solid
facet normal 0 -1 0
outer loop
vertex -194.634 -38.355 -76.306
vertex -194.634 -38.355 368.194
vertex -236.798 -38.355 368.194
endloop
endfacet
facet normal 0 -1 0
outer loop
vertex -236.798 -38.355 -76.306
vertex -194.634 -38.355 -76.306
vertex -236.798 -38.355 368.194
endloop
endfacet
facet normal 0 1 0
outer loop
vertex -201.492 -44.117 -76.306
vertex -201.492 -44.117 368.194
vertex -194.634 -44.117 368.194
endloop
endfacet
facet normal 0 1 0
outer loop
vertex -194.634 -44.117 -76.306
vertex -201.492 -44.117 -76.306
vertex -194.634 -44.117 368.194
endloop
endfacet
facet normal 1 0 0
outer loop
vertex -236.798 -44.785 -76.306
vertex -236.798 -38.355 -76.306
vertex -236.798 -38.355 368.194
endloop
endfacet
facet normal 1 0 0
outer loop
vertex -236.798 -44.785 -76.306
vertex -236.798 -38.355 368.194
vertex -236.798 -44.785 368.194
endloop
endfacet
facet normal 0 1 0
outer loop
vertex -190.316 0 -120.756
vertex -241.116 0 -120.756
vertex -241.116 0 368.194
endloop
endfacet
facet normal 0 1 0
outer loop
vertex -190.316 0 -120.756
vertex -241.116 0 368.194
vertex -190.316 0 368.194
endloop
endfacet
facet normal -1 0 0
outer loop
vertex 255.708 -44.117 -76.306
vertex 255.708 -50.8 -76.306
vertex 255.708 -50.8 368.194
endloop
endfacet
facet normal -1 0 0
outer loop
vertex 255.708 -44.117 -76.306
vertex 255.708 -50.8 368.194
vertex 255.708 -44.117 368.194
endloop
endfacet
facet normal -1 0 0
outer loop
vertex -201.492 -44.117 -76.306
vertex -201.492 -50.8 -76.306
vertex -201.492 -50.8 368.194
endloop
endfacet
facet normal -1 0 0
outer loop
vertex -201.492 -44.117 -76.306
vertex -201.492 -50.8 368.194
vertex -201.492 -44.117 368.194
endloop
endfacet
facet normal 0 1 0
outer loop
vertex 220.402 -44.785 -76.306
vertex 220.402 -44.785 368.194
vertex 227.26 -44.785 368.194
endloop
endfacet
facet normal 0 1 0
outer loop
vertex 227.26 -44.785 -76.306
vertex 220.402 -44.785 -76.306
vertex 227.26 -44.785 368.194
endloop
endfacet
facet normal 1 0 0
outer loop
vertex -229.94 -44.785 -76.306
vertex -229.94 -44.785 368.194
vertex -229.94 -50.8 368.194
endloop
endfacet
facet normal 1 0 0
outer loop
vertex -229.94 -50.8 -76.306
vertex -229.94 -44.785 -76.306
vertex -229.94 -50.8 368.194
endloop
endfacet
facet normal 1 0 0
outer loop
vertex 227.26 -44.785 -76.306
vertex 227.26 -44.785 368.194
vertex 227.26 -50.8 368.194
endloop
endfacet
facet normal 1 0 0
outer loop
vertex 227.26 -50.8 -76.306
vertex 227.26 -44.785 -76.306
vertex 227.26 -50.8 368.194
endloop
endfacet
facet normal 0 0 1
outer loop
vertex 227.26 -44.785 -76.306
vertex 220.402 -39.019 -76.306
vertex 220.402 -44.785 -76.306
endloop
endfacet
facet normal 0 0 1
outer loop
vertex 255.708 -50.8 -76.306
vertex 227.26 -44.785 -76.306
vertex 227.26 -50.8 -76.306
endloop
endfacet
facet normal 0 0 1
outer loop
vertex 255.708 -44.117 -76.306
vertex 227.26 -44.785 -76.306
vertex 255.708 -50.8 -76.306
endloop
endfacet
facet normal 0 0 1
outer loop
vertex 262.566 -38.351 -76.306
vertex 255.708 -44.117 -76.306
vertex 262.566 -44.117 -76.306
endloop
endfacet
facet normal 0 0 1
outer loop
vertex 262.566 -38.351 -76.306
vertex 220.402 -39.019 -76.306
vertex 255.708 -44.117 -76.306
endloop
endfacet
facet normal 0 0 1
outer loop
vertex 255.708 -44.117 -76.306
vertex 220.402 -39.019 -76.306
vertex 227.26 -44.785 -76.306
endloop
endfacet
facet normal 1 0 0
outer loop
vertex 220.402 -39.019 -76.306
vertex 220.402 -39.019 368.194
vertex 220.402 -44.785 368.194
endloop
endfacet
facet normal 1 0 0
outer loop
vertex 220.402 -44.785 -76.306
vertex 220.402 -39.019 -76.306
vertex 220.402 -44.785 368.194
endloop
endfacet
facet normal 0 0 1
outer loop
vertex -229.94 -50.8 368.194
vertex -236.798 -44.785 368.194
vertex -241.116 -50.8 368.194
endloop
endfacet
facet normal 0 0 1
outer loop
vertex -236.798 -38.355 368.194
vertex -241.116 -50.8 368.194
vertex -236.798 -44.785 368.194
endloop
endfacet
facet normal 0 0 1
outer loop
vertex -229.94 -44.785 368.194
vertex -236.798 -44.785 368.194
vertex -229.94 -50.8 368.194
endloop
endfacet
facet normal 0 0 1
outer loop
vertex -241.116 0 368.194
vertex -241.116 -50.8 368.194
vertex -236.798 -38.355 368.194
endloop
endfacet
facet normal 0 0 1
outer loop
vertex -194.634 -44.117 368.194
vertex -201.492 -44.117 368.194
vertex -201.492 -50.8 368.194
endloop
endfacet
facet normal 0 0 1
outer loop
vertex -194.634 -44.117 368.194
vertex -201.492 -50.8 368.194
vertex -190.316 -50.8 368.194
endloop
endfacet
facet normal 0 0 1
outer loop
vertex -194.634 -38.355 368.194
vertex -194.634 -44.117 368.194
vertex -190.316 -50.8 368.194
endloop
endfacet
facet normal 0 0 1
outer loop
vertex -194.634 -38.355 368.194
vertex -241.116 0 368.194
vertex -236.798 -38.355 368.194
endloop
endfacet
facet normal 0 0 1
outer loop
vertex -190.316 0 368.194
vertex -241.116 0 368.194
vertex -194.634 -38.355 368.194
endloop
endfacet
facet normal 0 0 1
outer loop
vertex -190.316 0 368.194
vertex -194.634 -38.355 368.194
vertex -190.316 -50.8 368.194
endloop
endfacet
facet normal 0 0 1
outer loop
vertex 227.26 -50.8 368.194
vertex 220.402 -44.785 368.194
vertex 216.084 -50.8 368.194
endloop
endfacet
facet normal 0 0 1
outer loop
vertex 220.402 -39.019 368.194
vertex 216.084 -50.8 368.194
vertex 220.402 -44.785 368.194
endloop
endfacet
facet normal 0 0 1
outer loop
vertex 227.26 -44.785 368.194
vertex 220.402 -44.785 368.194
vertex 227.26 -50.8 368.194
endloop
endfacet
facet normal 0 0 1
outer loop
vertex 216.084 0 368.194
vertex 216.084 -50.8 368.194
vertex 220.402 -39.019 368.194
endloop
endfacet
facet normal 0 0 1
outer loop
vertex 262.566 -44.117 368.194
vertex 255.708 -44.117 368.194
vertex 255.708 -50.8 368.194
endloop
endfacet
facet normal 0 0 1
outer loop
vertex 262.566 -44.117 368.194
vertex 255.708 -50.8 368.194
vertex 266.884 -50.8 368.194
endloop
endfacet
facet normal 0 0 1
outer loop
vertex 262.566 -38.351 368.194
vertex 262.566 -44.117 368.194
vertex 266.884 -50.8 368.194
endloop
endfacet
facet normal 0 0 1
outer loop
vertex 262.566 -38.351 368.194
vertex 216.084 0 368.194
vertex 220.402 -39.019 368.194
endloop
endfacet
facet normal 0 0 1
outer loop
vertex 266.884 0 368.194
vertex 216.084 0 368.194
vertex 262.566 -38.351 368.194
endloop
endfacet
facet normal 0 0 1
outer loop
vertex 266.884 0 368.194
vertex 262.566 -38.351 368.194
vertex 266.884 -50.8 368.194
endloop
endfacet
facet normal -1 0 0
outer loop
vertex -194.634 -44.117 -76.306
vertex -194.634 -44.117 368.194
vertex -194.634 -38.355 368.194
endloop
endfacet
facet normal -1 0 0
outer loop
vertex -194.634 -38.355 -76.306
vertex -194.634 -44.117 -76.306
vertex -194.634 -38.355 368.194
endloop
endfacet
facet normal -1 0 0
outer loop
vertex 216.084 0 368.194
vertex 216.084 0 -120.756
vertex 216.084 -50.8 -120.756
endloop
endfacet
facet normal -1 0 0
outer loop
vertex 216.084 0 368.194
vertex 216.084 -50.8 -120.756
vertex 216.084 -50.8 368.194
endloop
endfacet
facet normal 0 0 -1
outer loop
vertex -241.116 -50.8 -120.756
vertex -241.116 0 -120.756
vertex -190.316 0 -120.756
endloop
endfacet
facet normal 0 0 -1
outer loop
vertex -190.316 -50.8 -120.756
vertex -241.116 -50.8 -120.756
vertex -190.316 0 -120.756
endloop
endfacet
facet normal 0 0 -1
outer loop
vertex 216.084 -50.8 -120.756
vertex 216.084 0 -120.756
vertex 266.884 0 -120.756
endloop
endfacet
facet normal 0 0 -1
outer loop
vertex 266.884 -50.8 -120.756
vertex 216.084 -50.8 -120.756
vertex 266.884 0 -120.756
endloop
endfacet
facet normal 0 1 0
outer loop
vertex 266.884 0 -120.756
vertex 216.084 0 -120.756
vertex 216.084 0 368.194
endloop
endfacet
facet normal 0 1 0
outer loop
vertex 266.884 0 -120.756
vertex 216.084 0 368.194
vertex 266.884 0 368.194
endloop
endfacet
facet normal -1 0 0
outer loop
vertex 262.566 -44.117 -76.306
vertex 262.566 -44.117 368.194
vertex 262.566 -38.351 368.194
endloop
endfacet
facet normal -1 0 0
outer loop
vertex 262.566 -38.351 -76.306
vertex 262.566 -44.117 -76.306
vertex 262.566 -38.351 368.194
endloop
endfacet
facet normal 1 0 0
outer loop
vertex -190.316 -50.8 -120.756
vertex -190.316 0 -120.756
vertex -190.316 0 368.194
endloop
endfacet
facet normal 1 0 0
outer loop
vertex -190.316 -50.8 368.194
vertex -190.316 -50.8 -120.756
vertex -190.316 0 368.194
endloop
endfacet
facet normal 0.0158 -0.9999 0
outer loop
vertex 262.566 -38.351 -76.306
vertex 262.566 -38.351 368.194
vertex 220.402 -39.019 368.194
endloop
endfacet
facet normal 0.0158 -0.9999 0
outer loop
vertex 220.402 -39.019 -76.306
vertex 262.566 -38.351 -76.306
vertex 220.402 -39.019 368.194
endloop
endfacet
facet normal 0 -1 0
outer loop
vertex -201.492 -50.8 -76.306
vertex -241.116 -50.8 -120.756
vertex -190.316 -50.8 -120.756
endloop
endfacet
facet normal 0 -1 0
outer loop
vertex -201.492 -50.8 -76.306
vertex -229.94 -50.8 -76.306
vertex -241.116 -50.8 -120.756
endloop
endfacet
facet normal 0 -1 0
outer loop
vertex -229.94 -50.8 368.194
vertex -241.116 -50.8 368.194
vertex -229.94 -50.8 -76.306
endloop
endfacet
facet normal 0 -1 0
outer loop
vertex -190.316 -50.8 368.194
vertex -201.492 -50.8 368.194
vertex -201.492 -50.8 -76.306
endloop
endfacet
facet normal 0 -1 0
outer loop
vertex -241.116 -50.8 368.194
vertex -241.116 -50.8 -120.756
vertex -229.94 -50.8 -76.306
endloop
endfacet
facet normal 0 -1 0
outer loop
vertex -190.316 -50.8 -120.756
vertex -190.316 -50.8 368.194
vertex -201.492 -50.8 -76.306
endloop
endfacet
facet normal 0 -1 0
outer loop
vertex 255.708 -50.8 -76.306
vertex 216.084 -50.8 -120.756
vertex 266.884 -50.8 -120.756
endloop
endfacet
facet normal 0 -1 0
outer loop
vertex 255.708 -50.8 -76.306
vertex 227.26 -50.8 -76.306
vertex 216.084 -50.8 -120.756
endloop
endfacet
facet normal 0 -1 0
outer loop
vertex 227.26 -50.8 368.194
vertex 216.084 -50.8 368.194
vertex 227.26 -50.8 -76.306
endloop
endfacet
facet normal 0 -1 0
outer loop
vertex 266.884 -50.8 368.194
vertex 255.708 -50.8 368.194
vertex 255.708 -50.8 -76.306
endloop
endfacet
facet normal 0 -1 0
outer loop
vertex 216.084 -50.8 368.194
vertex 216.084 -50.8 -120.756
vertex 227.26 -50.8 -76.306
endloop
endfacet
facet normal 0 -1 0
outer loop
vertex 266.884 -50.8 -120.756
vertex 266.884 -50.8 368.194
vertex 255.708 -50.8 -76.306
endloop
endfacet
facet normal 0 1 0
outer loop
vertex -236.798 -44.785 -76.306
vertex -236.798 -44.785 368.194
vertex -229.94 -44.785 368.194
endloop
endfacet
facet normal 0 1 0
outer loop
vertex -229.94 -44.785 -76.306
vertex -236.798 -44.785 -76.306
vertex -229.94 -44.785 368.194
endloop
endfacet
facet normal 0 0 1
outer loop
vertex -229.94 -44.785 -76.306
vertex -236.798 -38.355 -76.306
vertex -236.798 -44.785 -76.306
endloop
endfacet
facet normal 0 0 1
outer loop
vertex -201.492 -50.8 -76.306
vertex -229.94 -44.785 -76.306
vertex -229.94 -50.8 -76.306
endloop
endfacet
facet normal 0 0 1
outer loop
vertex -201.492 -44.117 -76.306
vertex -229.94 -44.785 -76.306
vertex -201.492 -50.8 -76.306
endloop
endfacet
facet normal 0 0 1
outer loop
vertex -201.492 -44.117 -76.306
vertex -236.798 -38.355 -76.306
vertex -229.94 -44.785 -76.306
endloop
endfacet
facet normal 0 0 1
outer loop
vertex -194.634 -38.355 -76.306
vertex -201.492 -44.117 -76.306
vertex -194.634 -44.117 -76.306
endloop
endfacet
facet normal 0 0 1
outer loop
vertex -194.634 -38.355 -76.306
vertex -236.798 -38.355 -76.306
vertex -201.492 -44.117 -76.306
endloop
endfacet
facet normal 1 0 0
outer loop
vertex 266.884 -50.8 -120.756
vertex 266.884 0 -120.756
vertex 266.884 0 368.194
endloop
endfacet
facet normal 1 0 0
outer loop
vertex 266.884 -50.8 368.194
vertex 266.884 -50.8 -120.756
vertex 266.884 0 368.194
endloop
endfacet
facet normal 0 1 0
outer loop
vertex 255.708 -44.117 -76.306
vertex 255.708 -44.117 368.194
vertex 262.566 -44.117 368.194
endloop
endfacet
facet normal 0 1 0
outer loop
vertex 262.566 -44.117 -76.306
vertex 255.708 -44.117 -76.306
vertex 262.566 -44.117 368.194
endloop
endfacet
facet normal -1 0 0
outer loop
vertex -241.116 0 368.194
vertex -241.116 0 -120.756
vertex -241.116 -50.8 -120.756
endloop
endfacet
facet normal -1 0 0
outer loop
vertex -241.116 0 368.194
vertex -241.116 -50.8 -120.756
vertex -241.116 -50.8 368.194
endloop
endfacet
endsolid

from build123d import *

# Parameters (mm, degrees)
F0_W     = 50.8
F0_H     = 488.95
F1_DEPTH = 50.8
F3_DEPTH = 444.5
F4_DEPTH = 444.5


with BuildPart() as f1:
    # F0 (on Front) → F1 (new body)
    with BuildSketch(Plane.XZ):
        with Locations((-215.716244, 123.719156)):
            Rectangle(F0_W, F0_H)
        with Locations((241.483756, 123.719156)):
            Rectangle(F0_W, F0_H)
    extrude(amount=F1_DEPTH)

    # F2 (on face) → F3 (cut)
    with BuildSketch(Plane.XY.offset(368.194156)):
        Polygon((-229.940244, -44.785139), (-229.940244, -50.8), (-201.492244, -50.8), (-201.492244, -44.117086), (-194.634244, -44.117086), (-194.634244, -38.354754), (-236.798244, -38.354754), (-236.798244, -44.785139), align=None)
    extrude(amount=-F3_DEPTH, mode=Mode.SUBTRACT)

    # F2 (on face) → F4 (cut)
    with BuildSketch(Plane.XY.offset(368.194156)):
        Polygon((227.259756, -44.785139), (227.259756, -50.8), (255.707756, -50.8), (255.707756, -44.117086), (262.565756, -44.117086), (262.565756, -38.351286), (220.401756, -39.019339), (220.401756, -44.785139), align=None)
    extrude(amount=-F4_DEPTH, mode=Mode.SUBTRACT)


solid = f1.part
